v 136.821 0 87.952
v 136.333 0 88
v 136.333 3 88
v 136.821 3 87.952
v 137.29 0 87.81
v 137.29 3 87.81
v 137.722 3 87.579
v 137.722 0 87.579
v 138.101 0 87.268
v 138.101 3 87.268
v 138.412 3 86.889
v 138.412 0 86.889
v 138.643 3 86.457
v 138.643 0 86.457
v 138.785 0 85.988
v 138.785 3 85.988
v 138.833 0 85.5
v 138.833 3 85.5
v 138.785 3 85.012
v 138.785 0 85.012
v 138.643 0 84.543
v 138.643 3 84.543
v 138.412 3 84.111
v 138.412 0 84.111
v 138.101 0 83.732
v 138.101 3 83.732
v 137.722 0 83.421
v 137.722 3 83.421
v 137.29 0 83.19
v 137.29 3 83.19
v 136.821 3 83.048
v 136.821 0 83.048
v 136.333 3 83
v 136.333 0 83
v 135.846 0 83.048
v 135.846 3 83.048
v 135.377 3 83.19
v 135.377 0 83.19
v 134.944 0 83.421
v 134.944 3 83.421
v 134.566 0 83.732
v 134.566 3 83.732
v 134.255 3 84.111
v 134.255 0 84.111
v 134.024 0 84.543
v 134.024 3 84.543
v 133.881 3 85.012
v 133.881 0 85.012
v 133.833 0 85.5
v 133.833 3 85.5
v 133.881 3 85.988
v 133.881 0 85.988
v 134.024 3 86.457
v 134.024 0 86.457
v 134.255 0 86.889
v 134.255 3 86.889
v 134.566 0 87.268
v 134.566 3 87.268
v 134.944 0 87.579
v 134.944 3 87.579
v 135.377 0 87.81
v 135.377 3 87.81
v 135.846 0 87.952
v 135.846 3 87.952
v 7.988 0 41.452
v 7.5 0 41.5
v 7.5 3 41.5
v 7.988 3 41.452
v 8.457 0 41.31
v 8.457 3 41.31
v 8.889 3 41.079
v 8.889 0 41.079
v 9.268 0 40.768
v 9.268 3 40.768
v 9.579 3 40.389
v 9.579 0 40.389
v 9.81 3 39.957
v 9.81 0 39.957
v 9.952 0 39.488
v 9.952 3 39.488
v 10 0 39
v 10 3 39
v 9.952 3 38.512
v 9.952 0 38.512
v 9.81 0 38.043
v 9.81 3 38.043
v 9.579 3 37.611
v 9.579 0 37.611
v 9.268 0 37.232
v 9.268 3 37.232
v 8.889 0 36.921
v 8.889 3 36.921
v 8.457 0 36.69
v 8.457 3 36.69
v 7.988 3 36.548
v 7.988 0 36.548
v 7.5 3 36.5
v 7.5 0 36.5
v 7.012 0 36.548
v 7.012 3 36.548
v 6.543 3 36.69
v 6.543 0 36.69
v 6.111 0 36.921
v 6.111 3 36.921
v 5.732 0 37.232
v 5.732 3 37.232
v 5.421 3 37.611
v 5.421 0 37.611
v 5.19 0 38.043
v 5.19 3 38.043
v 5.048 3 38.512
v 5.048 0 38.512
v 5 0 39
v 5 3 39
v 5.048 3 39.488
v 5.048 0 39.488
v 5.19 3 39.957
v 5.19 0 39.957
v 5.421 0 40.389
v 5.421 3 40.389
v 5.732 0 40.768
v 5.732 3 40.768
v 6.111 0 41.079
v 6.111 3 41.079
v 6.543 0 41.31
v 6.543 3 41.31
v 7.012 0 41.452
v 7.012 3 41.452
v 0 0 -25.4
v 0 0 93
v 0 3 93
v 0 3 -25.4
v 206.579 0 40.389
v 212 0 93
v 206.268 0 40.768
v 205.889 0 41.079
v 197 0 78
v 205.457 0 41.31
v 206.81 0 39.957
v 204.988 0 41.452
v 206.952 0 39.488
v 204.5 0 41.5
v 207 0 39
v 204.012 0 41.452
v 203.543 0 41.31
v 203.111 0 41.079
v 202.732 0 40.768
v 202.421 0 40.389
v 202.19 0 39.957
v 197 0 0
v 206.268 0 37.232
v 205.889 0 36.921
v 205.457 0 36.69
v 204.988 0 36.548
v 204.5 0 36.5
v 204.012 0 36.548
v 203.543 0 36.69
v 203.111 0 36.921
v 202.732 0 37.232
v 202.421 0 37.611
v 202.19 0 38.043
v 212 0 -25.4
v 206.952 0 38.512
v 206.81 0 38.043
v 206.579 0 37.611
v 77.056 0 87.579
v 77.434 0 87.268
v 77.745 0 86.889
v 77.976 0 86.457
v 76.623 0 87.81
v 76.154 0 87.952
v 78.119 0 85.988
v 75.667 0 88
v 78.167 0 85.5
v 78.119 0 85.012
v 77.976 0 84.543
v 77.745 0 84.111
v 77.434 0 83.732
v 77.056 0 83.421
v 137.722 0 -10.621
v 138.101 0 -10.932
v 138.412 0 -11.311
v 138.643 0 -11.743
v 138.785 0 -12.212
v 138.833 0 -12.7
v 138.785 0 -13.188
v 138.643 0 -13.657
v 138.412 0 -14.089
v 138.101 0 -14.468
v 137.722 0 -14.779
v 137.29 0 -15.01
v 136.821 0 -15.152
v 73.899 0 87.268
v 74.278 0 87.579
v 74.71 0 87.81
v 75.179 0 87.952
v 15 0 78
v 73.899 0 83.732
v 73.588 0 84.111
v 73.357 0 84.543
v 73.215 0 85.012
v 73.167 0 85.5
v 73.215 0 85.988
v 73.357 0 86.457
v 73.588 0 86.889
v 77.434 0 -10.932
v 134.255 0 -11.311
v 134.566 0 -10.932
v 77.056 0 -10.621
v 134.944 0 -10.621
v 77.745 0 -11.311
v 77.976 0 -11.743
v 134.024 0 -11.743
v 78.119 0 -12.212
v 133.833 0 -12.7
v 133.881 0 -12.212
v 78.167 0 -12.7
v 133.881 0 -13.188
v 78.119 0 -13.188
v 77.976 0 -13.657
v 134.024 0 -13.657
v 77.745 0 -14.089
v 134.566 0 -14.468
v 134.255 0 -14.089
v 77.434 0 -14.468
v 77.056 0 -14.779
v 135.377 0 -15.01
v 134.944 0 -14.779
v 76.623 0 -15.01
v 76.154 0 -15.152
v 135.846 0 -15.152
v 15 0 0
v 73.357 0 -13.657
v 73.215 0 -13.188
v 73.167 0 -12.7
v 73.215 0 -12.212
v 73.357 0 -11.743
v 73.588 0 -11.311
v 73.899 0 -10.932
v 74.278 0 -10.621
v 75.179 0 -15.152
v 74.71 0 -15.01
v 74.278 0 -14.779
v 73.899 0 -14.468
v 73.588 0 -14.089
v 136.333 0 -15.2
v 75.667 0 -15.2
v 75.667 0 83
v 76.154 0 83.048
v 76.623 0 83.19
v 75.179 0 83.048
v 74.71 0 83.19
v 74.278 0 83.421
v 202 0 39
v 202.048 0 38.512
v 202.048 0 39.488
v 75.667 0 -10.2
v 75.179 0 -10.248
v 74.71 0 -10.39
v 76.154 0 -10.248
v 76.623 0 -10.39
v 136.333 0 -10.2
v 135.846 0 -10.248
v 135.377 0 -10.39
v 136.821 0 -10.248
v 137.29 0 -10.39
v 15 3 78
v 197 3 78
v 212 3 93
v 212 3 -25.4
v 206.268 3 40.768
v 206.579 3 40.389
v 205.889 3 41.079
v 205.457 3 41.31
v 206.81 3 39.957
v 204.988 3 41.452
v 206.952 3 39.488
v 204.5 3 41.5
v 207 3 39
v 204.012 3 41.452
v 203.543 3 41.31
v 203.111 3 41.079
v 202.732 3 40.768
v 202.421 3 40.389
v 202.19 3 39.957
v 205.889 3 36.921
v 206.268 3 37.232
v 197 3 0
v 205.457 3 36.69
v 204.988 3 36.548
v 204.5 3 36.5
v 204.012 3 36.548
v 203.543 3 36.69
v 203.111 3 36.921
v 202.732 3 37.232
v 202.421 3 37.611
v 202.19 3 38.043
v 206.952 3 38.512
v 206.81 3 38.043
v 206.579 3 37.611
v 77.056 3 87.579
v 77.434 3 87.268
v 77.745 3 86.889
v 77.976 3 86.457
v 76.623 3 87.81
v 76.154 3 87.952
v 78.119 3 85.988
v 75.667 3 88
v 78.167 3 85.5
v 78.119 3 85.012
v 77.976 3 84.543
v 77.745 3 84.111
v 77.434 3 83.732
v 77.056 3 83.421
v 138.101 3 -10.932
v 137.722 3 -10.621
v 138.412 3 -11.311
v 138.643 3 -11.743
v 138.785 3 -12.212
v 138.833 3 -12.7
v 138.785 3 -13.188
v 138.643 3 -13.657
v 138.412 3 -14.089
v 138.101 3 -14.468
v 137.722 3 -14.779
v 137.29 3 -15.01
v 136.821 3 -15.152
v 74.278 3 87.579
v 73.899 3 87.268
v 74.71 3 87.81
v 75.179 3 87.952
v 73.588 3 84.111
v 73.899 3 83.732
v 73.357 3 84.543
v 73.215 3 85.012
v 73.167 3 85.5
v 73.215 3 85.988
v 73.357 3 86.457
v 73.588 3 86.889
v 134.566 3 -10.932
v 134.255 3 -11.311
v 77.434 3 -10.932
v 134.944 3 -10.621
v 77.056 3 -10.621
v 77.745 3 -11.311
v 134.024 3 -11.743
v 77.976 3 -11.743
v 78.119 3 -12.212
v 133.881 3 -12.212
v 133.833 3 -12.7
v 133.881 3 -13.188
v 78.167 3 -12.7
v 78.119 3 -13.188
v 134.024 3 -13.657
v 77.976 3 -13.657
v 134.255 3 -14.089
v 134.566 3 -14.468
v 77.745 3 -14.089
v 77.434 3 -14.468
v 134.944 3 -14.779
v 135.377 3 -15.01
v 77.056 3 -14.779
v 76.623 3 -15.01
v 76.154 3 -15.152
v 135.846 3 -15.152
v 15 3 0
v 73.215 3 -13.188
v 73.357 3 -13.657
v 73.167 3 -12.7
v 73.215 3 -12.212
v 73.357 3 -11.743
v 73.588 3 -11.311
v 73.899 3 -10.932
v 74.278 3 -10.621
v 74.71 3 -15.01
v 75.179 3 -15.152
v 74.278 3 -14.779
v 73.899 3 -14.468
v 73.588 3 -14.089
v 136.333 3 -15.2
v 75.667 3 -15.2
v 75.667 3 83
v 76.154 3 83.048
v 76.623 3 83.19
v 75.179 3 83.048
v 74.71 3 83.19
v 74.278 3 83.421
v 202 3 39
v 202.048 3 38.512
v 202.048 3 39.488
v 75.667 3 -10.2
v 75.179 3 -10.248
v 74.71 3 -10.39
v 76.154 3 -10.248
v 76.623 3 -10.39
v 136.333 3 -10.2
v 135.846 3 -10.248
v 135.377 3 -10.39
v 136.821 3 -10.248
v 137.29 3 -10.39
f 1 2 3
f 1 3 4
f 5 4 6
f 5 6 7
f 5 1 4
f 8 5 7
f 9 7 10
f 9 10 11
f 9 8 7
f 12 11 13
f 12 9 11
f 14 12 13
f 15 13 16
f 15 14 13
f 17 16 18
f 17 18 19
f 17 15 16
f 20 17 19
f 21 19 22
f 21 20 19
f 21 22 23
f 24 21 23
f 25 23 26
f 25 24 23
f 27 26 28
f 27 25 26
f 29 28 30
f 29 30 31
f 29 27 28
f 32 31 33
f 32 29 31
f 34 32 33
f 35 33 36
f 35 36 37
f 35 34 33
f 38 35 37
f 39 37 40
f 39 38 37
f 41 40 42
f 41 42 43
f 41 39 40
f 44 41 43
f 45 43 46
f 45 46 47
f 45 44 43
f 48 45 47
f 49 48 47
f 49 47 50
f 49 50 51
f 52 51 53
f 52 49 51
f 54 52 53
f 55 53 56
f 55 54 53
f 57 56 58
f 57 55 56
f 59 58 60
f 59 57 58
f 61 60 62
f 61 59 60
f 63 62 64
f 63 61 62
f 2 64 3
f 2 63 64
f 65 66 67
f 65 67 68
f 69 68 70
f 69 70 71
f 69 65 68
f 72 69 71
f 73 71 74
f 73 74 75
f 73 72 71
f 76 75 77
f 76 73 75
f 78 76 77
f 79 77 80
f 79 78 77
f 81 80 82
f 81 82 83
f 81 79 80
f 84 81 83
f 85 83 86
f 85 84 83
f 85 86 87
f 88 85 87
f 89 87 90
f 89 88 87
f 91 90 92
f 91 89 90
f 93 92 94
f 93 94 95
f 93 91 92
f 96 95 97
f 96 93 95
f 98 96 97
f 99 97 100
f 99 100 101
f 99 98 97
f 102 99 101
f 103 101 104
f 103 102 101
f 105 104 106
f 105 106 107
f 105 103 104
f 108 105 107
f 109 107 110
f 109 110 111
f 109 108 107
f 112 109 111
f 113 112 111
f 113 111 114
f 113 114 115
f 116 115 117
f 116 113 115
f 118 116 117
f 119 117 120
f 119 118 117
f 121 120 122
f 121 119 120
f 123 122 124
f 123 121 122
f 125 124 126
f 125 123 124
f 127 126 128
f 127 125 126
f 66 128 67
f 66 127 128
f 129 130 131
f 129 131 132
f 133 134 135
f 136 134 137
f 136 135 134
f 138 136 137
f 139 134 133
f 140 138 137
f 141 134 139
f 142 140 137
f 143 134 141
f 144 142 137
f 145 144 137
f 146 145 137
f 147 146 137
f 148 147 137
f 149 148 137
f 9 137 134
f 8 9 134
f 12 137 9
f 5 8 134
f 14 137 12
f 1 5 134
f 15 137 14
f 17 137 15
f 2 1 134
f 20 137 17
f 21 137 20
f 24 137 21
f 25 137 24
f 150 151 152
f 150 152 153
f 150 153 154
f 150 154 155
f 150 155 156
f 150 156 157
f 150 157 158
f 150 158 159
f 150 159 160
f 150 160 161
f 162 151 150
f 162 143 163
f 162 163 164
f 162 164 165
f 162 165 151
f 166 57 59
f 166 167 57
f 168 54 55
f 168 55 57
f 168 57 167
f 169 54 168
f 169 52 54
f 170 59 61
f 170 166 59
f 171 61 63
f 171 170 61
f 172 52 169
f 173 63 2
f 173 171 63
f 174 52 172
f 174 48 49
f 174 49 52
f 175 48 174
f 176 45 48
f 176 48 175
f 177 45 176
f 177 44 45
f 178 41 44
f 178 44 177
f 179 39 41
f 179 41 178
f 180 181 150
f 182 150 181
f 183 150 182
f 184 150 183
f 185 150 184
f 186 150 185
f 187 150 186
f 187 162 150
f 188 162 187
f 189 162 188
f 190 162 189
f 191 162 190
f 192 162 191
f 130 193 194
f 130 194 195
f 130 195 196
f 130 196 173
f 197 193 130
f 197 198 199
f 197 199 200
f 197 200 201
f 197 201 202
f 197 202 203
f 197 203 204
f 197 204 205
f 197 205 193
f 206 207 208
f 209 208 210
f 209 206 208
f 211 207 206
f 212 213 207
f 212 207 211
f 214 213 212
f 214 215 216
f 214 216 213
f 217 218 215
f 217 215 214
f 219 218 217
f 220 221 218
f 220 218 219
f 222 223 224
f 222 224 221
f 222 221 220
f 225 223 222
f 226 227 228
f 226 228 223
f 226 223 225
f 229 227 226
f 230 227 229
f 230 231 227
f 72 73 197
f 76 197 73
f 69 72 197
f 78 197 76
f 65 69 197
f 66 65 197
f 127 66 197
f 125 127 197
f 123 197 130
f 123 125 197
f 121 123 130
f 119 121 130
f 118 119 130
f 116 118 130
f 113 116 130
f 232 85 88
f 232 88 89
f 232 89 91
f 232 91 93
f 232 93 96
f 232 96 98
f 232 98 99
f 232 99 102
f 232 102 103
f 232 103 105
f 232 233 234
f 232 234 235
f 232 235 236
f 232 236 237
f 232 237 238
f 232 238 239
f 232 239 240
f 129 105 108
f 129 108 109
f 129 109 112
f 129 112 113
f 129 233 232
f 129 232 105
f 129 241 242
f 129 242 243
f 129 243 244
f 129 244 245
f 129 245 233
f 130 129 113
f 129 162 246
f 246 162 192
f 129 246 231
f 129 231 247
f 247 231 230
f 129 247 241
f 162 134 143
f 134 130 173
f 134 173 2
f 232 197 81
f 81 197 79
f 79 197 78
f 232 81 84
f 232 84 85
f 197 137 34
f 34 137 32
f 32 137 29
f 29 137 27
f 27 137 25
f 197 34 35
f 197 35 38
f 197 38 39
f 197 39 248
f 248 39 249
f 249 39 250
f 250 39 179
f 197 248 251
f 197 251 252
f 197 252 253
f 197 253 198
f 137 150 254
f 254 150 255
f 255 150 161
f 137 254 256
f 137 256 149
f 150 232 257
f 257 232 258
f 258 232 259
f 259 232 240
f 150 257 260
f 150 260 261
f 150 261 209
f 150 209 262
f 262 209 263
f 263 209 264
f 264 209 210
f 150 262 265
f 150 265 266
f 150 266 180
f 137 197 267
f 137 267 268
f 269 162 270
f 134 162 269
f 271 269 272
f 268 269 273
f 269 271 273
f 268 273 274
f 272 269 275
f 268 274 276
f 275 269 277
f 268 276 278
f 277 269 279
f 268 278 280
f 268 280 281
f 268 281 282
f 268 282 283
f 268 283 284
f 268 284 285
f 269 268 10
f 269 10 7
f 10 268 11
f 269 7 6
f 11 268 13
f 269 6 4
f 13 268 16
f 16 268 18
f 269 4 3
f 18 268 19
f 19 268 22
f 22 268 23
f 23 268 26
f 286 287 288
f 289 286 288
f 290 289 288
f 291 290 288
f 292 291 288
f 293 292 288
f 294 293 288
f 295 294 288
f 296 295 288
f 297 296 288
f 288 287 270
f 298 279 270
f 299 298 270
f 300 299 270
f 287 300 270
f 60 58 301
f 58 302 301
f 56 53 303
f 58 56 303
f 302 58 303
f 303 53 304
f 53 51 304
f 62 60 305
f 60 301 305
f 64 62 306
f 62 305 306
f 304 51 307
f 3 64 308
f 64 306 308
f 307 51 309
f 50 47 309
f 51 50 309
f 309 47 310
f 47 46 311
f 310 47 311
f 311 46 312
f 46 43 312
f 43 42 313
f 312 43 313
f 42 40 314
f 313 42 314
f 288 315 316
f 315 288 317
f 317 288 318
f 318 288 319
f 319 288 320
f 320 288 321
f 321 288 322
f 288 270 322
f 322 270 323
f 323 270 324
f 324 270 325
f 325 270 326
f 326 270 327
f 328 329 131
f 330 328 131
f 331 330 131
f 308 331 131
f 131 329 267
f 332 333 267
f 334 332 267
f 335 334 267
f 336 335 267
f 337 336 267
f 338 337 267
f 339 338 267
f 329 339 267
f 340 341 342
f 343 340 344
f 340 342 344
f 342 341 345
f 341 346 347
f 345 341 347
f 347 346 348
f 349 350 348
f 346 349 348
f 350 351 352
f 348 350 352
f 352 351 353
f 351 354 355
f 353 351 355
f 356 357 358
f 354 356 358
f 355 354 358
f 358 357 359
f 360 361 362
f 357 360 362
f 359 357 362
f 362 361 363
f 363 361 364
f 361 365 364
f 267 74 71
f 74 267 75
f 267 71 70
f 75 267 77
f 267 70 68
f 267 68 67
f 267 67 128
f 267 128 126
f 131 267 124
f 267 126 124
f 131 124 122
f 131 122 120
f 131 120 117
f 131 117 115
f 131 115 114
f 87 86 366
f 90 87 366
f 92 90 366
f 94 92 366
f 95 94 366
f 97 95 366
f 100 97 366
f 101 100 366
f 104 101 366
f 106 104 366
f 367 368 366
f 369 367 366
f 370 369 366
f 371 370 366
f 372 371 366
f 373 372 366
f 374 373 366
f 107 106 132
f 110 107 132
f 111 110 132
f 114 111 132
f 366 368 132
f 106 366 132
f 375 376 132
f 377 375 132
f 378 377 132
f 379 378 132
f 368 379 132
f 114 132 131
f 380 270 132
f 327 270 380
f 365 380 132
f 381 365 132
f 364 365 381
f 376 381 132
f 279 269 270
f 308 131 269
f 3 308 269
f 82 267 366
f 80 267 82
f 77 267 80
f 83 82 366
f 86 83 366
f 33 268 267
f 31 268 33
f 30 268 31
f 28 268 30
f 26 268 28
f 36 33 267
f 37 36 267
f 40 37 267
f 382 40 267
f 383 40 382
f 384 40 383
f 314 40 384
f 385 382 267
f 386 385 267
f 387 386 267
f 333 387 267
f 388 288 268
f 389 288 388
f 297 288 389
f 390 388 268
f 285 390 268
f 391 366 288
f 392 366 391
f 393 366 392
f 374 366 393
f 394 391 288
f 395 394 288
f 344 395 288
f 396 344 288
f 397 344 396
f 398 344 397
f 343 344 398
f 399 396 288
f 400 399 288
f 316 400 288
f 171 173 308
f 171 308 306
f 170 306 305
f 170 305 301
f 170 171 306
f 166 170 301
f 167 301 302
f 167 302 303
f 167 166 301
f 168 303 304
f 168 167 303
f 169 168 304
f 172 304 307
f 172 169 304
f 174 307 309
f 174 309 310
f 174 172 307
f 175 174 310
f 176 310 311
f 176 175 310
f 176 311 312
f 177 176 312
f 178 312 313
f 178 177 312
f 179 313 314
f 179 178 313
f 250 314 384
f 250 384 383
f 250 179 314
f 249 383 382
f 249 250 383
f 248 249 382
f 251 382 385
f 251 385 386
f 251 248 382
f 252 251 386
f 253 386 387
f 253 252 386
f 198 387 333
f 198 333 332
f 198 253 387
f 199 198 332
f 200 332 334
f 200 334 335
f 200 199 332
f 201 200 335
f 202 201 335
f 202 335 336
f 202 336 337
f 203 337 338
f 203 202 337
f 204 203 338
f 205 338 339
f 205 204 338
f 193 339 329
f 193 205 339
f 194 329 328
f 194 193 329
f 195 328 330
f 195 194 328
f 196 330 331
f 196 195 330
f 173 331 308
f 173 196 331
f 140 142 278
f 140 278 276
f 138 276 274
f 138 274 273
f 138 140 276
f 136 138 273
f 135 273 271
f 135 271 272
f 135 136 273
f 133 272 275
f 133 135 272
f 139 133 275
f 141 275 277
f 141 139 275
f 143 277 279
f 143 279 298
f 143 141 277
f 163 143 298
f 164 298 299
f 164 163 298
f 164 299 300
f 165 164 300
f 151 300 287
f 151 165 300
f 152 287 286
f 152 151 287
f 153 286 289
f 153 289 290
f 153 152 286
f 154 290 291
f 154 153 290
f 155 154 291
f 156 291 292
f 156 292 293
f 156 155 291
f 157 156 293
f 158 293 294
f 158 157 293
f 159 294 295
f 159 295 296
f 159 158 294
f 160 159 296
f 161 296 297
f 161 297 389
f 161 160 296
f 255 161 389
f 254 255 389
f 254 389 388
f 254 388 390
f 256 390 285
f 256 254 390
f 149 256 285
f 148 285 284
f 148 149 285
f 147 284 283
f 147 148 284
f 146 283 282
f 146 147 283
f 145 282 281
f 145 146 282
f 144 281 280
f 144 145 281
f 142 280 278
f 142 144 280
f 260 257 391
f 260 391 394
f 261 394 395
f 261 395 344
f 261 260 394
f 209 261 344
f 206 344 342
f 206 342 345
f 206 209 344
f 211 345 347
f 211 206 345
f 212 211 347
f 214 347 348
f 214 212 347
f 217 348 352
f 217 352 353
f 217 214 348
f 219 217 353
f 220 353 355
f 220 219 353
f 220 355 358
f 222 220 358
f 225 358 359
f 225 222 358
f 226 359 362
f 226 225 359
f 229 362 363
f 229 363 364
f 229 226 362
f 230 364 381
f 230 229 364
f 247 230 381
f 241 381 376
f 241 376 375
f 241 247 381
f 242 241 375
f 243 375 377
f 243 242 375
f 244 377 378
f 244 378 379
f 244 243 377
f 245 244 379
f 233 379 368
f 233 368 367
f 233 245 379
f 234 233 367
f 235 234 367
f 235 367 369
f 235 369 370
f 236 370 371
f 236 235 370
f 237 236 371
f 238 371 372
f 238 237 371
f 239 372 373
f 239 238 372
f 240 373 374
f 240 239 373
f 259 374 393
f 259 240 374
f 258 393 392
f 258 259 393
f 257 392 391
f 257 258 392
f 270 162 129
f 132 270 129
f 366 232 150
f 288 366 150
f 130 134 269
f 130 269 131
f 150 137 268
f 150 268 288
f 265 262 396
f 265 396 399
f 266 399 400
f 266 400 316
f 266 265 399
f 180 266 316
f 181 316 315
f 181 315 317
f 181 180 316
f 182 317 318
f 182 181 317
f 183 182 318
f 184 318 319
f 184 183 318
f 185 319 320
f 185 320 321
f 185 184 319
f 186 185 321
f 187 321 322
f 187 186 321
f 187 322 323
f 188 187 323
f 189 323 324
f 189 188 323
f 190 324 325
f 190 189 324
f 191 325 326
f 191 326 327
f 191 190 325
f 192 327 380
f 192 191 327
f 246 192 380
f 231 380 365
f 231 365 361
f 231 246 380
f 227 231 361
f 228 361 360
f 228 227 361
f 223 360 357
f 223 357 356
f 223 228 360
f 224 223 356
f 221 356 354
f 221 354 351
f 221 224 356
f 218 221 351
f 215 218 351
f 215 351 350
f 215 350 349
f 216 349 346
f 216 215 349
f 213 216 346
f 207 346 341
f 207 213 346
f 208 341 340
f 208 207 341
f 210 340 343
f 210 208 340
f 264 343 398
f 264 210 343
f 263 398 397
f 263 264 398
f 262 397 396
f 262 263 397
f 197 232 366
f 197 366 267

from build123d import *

# Parameters (mm, degrees)
SKETCH1_5_W         = 212
SKETCH1_5_H         = 118.4
SKETCH1_5_W_2       = 182
SKETCH1_5_H_2       = 78
SKETCH1_5_R         = 2.5
BOSS_EXTRUDE4_DEPTH = 3


with BuildPart() as part:
    # Sketch1<5> → Boss-Extrude4 (new body)
    with BuildSketch(Plane(origin=(0, 0, 0), x_dir=(1, 0, 0), z_dir=(0, 1, 0))):
        with Locations((106, -33.8)):
            Rectangle(SKETCH1_5_W, SKETCH1_5_H)
        with Locations((106, -39)):
            Rectangle(SKETCH1_5_W_2, SKETCH1_5_H_2, mode=Mode.SUBTRACT)
        with Locations((75.666666667, 12.7)):
            Circle(SKETCH1_5_R, mode=Mode.SUBTRACT)
        with Locations((136.333333333, 12.7)):
            Circle(SKETCH1_5_R, mode=Mode.SUBTRACT)
        with Locations((7.5, -39)):
            Circle(SKETCH1_5_R, mode=Mode.SUBTRACT)
        with Locations((204.5, -39)):
            Circle(SKETCH1_5_R, mode=Mode.SUBTRACT)
        with Locations((75.666666667, -85.5)):
            Circle(SKETCH1_5_R, mode=Mode.SUBTRACT)
        with Locations((136.333333333, -85.5)):
            Circle(SKETCH1_5_R, mode=Mode.SUBTRACT)
    extrude(amount=BOSS_EXTRUDE4_DEPTH)


solid = part.part
